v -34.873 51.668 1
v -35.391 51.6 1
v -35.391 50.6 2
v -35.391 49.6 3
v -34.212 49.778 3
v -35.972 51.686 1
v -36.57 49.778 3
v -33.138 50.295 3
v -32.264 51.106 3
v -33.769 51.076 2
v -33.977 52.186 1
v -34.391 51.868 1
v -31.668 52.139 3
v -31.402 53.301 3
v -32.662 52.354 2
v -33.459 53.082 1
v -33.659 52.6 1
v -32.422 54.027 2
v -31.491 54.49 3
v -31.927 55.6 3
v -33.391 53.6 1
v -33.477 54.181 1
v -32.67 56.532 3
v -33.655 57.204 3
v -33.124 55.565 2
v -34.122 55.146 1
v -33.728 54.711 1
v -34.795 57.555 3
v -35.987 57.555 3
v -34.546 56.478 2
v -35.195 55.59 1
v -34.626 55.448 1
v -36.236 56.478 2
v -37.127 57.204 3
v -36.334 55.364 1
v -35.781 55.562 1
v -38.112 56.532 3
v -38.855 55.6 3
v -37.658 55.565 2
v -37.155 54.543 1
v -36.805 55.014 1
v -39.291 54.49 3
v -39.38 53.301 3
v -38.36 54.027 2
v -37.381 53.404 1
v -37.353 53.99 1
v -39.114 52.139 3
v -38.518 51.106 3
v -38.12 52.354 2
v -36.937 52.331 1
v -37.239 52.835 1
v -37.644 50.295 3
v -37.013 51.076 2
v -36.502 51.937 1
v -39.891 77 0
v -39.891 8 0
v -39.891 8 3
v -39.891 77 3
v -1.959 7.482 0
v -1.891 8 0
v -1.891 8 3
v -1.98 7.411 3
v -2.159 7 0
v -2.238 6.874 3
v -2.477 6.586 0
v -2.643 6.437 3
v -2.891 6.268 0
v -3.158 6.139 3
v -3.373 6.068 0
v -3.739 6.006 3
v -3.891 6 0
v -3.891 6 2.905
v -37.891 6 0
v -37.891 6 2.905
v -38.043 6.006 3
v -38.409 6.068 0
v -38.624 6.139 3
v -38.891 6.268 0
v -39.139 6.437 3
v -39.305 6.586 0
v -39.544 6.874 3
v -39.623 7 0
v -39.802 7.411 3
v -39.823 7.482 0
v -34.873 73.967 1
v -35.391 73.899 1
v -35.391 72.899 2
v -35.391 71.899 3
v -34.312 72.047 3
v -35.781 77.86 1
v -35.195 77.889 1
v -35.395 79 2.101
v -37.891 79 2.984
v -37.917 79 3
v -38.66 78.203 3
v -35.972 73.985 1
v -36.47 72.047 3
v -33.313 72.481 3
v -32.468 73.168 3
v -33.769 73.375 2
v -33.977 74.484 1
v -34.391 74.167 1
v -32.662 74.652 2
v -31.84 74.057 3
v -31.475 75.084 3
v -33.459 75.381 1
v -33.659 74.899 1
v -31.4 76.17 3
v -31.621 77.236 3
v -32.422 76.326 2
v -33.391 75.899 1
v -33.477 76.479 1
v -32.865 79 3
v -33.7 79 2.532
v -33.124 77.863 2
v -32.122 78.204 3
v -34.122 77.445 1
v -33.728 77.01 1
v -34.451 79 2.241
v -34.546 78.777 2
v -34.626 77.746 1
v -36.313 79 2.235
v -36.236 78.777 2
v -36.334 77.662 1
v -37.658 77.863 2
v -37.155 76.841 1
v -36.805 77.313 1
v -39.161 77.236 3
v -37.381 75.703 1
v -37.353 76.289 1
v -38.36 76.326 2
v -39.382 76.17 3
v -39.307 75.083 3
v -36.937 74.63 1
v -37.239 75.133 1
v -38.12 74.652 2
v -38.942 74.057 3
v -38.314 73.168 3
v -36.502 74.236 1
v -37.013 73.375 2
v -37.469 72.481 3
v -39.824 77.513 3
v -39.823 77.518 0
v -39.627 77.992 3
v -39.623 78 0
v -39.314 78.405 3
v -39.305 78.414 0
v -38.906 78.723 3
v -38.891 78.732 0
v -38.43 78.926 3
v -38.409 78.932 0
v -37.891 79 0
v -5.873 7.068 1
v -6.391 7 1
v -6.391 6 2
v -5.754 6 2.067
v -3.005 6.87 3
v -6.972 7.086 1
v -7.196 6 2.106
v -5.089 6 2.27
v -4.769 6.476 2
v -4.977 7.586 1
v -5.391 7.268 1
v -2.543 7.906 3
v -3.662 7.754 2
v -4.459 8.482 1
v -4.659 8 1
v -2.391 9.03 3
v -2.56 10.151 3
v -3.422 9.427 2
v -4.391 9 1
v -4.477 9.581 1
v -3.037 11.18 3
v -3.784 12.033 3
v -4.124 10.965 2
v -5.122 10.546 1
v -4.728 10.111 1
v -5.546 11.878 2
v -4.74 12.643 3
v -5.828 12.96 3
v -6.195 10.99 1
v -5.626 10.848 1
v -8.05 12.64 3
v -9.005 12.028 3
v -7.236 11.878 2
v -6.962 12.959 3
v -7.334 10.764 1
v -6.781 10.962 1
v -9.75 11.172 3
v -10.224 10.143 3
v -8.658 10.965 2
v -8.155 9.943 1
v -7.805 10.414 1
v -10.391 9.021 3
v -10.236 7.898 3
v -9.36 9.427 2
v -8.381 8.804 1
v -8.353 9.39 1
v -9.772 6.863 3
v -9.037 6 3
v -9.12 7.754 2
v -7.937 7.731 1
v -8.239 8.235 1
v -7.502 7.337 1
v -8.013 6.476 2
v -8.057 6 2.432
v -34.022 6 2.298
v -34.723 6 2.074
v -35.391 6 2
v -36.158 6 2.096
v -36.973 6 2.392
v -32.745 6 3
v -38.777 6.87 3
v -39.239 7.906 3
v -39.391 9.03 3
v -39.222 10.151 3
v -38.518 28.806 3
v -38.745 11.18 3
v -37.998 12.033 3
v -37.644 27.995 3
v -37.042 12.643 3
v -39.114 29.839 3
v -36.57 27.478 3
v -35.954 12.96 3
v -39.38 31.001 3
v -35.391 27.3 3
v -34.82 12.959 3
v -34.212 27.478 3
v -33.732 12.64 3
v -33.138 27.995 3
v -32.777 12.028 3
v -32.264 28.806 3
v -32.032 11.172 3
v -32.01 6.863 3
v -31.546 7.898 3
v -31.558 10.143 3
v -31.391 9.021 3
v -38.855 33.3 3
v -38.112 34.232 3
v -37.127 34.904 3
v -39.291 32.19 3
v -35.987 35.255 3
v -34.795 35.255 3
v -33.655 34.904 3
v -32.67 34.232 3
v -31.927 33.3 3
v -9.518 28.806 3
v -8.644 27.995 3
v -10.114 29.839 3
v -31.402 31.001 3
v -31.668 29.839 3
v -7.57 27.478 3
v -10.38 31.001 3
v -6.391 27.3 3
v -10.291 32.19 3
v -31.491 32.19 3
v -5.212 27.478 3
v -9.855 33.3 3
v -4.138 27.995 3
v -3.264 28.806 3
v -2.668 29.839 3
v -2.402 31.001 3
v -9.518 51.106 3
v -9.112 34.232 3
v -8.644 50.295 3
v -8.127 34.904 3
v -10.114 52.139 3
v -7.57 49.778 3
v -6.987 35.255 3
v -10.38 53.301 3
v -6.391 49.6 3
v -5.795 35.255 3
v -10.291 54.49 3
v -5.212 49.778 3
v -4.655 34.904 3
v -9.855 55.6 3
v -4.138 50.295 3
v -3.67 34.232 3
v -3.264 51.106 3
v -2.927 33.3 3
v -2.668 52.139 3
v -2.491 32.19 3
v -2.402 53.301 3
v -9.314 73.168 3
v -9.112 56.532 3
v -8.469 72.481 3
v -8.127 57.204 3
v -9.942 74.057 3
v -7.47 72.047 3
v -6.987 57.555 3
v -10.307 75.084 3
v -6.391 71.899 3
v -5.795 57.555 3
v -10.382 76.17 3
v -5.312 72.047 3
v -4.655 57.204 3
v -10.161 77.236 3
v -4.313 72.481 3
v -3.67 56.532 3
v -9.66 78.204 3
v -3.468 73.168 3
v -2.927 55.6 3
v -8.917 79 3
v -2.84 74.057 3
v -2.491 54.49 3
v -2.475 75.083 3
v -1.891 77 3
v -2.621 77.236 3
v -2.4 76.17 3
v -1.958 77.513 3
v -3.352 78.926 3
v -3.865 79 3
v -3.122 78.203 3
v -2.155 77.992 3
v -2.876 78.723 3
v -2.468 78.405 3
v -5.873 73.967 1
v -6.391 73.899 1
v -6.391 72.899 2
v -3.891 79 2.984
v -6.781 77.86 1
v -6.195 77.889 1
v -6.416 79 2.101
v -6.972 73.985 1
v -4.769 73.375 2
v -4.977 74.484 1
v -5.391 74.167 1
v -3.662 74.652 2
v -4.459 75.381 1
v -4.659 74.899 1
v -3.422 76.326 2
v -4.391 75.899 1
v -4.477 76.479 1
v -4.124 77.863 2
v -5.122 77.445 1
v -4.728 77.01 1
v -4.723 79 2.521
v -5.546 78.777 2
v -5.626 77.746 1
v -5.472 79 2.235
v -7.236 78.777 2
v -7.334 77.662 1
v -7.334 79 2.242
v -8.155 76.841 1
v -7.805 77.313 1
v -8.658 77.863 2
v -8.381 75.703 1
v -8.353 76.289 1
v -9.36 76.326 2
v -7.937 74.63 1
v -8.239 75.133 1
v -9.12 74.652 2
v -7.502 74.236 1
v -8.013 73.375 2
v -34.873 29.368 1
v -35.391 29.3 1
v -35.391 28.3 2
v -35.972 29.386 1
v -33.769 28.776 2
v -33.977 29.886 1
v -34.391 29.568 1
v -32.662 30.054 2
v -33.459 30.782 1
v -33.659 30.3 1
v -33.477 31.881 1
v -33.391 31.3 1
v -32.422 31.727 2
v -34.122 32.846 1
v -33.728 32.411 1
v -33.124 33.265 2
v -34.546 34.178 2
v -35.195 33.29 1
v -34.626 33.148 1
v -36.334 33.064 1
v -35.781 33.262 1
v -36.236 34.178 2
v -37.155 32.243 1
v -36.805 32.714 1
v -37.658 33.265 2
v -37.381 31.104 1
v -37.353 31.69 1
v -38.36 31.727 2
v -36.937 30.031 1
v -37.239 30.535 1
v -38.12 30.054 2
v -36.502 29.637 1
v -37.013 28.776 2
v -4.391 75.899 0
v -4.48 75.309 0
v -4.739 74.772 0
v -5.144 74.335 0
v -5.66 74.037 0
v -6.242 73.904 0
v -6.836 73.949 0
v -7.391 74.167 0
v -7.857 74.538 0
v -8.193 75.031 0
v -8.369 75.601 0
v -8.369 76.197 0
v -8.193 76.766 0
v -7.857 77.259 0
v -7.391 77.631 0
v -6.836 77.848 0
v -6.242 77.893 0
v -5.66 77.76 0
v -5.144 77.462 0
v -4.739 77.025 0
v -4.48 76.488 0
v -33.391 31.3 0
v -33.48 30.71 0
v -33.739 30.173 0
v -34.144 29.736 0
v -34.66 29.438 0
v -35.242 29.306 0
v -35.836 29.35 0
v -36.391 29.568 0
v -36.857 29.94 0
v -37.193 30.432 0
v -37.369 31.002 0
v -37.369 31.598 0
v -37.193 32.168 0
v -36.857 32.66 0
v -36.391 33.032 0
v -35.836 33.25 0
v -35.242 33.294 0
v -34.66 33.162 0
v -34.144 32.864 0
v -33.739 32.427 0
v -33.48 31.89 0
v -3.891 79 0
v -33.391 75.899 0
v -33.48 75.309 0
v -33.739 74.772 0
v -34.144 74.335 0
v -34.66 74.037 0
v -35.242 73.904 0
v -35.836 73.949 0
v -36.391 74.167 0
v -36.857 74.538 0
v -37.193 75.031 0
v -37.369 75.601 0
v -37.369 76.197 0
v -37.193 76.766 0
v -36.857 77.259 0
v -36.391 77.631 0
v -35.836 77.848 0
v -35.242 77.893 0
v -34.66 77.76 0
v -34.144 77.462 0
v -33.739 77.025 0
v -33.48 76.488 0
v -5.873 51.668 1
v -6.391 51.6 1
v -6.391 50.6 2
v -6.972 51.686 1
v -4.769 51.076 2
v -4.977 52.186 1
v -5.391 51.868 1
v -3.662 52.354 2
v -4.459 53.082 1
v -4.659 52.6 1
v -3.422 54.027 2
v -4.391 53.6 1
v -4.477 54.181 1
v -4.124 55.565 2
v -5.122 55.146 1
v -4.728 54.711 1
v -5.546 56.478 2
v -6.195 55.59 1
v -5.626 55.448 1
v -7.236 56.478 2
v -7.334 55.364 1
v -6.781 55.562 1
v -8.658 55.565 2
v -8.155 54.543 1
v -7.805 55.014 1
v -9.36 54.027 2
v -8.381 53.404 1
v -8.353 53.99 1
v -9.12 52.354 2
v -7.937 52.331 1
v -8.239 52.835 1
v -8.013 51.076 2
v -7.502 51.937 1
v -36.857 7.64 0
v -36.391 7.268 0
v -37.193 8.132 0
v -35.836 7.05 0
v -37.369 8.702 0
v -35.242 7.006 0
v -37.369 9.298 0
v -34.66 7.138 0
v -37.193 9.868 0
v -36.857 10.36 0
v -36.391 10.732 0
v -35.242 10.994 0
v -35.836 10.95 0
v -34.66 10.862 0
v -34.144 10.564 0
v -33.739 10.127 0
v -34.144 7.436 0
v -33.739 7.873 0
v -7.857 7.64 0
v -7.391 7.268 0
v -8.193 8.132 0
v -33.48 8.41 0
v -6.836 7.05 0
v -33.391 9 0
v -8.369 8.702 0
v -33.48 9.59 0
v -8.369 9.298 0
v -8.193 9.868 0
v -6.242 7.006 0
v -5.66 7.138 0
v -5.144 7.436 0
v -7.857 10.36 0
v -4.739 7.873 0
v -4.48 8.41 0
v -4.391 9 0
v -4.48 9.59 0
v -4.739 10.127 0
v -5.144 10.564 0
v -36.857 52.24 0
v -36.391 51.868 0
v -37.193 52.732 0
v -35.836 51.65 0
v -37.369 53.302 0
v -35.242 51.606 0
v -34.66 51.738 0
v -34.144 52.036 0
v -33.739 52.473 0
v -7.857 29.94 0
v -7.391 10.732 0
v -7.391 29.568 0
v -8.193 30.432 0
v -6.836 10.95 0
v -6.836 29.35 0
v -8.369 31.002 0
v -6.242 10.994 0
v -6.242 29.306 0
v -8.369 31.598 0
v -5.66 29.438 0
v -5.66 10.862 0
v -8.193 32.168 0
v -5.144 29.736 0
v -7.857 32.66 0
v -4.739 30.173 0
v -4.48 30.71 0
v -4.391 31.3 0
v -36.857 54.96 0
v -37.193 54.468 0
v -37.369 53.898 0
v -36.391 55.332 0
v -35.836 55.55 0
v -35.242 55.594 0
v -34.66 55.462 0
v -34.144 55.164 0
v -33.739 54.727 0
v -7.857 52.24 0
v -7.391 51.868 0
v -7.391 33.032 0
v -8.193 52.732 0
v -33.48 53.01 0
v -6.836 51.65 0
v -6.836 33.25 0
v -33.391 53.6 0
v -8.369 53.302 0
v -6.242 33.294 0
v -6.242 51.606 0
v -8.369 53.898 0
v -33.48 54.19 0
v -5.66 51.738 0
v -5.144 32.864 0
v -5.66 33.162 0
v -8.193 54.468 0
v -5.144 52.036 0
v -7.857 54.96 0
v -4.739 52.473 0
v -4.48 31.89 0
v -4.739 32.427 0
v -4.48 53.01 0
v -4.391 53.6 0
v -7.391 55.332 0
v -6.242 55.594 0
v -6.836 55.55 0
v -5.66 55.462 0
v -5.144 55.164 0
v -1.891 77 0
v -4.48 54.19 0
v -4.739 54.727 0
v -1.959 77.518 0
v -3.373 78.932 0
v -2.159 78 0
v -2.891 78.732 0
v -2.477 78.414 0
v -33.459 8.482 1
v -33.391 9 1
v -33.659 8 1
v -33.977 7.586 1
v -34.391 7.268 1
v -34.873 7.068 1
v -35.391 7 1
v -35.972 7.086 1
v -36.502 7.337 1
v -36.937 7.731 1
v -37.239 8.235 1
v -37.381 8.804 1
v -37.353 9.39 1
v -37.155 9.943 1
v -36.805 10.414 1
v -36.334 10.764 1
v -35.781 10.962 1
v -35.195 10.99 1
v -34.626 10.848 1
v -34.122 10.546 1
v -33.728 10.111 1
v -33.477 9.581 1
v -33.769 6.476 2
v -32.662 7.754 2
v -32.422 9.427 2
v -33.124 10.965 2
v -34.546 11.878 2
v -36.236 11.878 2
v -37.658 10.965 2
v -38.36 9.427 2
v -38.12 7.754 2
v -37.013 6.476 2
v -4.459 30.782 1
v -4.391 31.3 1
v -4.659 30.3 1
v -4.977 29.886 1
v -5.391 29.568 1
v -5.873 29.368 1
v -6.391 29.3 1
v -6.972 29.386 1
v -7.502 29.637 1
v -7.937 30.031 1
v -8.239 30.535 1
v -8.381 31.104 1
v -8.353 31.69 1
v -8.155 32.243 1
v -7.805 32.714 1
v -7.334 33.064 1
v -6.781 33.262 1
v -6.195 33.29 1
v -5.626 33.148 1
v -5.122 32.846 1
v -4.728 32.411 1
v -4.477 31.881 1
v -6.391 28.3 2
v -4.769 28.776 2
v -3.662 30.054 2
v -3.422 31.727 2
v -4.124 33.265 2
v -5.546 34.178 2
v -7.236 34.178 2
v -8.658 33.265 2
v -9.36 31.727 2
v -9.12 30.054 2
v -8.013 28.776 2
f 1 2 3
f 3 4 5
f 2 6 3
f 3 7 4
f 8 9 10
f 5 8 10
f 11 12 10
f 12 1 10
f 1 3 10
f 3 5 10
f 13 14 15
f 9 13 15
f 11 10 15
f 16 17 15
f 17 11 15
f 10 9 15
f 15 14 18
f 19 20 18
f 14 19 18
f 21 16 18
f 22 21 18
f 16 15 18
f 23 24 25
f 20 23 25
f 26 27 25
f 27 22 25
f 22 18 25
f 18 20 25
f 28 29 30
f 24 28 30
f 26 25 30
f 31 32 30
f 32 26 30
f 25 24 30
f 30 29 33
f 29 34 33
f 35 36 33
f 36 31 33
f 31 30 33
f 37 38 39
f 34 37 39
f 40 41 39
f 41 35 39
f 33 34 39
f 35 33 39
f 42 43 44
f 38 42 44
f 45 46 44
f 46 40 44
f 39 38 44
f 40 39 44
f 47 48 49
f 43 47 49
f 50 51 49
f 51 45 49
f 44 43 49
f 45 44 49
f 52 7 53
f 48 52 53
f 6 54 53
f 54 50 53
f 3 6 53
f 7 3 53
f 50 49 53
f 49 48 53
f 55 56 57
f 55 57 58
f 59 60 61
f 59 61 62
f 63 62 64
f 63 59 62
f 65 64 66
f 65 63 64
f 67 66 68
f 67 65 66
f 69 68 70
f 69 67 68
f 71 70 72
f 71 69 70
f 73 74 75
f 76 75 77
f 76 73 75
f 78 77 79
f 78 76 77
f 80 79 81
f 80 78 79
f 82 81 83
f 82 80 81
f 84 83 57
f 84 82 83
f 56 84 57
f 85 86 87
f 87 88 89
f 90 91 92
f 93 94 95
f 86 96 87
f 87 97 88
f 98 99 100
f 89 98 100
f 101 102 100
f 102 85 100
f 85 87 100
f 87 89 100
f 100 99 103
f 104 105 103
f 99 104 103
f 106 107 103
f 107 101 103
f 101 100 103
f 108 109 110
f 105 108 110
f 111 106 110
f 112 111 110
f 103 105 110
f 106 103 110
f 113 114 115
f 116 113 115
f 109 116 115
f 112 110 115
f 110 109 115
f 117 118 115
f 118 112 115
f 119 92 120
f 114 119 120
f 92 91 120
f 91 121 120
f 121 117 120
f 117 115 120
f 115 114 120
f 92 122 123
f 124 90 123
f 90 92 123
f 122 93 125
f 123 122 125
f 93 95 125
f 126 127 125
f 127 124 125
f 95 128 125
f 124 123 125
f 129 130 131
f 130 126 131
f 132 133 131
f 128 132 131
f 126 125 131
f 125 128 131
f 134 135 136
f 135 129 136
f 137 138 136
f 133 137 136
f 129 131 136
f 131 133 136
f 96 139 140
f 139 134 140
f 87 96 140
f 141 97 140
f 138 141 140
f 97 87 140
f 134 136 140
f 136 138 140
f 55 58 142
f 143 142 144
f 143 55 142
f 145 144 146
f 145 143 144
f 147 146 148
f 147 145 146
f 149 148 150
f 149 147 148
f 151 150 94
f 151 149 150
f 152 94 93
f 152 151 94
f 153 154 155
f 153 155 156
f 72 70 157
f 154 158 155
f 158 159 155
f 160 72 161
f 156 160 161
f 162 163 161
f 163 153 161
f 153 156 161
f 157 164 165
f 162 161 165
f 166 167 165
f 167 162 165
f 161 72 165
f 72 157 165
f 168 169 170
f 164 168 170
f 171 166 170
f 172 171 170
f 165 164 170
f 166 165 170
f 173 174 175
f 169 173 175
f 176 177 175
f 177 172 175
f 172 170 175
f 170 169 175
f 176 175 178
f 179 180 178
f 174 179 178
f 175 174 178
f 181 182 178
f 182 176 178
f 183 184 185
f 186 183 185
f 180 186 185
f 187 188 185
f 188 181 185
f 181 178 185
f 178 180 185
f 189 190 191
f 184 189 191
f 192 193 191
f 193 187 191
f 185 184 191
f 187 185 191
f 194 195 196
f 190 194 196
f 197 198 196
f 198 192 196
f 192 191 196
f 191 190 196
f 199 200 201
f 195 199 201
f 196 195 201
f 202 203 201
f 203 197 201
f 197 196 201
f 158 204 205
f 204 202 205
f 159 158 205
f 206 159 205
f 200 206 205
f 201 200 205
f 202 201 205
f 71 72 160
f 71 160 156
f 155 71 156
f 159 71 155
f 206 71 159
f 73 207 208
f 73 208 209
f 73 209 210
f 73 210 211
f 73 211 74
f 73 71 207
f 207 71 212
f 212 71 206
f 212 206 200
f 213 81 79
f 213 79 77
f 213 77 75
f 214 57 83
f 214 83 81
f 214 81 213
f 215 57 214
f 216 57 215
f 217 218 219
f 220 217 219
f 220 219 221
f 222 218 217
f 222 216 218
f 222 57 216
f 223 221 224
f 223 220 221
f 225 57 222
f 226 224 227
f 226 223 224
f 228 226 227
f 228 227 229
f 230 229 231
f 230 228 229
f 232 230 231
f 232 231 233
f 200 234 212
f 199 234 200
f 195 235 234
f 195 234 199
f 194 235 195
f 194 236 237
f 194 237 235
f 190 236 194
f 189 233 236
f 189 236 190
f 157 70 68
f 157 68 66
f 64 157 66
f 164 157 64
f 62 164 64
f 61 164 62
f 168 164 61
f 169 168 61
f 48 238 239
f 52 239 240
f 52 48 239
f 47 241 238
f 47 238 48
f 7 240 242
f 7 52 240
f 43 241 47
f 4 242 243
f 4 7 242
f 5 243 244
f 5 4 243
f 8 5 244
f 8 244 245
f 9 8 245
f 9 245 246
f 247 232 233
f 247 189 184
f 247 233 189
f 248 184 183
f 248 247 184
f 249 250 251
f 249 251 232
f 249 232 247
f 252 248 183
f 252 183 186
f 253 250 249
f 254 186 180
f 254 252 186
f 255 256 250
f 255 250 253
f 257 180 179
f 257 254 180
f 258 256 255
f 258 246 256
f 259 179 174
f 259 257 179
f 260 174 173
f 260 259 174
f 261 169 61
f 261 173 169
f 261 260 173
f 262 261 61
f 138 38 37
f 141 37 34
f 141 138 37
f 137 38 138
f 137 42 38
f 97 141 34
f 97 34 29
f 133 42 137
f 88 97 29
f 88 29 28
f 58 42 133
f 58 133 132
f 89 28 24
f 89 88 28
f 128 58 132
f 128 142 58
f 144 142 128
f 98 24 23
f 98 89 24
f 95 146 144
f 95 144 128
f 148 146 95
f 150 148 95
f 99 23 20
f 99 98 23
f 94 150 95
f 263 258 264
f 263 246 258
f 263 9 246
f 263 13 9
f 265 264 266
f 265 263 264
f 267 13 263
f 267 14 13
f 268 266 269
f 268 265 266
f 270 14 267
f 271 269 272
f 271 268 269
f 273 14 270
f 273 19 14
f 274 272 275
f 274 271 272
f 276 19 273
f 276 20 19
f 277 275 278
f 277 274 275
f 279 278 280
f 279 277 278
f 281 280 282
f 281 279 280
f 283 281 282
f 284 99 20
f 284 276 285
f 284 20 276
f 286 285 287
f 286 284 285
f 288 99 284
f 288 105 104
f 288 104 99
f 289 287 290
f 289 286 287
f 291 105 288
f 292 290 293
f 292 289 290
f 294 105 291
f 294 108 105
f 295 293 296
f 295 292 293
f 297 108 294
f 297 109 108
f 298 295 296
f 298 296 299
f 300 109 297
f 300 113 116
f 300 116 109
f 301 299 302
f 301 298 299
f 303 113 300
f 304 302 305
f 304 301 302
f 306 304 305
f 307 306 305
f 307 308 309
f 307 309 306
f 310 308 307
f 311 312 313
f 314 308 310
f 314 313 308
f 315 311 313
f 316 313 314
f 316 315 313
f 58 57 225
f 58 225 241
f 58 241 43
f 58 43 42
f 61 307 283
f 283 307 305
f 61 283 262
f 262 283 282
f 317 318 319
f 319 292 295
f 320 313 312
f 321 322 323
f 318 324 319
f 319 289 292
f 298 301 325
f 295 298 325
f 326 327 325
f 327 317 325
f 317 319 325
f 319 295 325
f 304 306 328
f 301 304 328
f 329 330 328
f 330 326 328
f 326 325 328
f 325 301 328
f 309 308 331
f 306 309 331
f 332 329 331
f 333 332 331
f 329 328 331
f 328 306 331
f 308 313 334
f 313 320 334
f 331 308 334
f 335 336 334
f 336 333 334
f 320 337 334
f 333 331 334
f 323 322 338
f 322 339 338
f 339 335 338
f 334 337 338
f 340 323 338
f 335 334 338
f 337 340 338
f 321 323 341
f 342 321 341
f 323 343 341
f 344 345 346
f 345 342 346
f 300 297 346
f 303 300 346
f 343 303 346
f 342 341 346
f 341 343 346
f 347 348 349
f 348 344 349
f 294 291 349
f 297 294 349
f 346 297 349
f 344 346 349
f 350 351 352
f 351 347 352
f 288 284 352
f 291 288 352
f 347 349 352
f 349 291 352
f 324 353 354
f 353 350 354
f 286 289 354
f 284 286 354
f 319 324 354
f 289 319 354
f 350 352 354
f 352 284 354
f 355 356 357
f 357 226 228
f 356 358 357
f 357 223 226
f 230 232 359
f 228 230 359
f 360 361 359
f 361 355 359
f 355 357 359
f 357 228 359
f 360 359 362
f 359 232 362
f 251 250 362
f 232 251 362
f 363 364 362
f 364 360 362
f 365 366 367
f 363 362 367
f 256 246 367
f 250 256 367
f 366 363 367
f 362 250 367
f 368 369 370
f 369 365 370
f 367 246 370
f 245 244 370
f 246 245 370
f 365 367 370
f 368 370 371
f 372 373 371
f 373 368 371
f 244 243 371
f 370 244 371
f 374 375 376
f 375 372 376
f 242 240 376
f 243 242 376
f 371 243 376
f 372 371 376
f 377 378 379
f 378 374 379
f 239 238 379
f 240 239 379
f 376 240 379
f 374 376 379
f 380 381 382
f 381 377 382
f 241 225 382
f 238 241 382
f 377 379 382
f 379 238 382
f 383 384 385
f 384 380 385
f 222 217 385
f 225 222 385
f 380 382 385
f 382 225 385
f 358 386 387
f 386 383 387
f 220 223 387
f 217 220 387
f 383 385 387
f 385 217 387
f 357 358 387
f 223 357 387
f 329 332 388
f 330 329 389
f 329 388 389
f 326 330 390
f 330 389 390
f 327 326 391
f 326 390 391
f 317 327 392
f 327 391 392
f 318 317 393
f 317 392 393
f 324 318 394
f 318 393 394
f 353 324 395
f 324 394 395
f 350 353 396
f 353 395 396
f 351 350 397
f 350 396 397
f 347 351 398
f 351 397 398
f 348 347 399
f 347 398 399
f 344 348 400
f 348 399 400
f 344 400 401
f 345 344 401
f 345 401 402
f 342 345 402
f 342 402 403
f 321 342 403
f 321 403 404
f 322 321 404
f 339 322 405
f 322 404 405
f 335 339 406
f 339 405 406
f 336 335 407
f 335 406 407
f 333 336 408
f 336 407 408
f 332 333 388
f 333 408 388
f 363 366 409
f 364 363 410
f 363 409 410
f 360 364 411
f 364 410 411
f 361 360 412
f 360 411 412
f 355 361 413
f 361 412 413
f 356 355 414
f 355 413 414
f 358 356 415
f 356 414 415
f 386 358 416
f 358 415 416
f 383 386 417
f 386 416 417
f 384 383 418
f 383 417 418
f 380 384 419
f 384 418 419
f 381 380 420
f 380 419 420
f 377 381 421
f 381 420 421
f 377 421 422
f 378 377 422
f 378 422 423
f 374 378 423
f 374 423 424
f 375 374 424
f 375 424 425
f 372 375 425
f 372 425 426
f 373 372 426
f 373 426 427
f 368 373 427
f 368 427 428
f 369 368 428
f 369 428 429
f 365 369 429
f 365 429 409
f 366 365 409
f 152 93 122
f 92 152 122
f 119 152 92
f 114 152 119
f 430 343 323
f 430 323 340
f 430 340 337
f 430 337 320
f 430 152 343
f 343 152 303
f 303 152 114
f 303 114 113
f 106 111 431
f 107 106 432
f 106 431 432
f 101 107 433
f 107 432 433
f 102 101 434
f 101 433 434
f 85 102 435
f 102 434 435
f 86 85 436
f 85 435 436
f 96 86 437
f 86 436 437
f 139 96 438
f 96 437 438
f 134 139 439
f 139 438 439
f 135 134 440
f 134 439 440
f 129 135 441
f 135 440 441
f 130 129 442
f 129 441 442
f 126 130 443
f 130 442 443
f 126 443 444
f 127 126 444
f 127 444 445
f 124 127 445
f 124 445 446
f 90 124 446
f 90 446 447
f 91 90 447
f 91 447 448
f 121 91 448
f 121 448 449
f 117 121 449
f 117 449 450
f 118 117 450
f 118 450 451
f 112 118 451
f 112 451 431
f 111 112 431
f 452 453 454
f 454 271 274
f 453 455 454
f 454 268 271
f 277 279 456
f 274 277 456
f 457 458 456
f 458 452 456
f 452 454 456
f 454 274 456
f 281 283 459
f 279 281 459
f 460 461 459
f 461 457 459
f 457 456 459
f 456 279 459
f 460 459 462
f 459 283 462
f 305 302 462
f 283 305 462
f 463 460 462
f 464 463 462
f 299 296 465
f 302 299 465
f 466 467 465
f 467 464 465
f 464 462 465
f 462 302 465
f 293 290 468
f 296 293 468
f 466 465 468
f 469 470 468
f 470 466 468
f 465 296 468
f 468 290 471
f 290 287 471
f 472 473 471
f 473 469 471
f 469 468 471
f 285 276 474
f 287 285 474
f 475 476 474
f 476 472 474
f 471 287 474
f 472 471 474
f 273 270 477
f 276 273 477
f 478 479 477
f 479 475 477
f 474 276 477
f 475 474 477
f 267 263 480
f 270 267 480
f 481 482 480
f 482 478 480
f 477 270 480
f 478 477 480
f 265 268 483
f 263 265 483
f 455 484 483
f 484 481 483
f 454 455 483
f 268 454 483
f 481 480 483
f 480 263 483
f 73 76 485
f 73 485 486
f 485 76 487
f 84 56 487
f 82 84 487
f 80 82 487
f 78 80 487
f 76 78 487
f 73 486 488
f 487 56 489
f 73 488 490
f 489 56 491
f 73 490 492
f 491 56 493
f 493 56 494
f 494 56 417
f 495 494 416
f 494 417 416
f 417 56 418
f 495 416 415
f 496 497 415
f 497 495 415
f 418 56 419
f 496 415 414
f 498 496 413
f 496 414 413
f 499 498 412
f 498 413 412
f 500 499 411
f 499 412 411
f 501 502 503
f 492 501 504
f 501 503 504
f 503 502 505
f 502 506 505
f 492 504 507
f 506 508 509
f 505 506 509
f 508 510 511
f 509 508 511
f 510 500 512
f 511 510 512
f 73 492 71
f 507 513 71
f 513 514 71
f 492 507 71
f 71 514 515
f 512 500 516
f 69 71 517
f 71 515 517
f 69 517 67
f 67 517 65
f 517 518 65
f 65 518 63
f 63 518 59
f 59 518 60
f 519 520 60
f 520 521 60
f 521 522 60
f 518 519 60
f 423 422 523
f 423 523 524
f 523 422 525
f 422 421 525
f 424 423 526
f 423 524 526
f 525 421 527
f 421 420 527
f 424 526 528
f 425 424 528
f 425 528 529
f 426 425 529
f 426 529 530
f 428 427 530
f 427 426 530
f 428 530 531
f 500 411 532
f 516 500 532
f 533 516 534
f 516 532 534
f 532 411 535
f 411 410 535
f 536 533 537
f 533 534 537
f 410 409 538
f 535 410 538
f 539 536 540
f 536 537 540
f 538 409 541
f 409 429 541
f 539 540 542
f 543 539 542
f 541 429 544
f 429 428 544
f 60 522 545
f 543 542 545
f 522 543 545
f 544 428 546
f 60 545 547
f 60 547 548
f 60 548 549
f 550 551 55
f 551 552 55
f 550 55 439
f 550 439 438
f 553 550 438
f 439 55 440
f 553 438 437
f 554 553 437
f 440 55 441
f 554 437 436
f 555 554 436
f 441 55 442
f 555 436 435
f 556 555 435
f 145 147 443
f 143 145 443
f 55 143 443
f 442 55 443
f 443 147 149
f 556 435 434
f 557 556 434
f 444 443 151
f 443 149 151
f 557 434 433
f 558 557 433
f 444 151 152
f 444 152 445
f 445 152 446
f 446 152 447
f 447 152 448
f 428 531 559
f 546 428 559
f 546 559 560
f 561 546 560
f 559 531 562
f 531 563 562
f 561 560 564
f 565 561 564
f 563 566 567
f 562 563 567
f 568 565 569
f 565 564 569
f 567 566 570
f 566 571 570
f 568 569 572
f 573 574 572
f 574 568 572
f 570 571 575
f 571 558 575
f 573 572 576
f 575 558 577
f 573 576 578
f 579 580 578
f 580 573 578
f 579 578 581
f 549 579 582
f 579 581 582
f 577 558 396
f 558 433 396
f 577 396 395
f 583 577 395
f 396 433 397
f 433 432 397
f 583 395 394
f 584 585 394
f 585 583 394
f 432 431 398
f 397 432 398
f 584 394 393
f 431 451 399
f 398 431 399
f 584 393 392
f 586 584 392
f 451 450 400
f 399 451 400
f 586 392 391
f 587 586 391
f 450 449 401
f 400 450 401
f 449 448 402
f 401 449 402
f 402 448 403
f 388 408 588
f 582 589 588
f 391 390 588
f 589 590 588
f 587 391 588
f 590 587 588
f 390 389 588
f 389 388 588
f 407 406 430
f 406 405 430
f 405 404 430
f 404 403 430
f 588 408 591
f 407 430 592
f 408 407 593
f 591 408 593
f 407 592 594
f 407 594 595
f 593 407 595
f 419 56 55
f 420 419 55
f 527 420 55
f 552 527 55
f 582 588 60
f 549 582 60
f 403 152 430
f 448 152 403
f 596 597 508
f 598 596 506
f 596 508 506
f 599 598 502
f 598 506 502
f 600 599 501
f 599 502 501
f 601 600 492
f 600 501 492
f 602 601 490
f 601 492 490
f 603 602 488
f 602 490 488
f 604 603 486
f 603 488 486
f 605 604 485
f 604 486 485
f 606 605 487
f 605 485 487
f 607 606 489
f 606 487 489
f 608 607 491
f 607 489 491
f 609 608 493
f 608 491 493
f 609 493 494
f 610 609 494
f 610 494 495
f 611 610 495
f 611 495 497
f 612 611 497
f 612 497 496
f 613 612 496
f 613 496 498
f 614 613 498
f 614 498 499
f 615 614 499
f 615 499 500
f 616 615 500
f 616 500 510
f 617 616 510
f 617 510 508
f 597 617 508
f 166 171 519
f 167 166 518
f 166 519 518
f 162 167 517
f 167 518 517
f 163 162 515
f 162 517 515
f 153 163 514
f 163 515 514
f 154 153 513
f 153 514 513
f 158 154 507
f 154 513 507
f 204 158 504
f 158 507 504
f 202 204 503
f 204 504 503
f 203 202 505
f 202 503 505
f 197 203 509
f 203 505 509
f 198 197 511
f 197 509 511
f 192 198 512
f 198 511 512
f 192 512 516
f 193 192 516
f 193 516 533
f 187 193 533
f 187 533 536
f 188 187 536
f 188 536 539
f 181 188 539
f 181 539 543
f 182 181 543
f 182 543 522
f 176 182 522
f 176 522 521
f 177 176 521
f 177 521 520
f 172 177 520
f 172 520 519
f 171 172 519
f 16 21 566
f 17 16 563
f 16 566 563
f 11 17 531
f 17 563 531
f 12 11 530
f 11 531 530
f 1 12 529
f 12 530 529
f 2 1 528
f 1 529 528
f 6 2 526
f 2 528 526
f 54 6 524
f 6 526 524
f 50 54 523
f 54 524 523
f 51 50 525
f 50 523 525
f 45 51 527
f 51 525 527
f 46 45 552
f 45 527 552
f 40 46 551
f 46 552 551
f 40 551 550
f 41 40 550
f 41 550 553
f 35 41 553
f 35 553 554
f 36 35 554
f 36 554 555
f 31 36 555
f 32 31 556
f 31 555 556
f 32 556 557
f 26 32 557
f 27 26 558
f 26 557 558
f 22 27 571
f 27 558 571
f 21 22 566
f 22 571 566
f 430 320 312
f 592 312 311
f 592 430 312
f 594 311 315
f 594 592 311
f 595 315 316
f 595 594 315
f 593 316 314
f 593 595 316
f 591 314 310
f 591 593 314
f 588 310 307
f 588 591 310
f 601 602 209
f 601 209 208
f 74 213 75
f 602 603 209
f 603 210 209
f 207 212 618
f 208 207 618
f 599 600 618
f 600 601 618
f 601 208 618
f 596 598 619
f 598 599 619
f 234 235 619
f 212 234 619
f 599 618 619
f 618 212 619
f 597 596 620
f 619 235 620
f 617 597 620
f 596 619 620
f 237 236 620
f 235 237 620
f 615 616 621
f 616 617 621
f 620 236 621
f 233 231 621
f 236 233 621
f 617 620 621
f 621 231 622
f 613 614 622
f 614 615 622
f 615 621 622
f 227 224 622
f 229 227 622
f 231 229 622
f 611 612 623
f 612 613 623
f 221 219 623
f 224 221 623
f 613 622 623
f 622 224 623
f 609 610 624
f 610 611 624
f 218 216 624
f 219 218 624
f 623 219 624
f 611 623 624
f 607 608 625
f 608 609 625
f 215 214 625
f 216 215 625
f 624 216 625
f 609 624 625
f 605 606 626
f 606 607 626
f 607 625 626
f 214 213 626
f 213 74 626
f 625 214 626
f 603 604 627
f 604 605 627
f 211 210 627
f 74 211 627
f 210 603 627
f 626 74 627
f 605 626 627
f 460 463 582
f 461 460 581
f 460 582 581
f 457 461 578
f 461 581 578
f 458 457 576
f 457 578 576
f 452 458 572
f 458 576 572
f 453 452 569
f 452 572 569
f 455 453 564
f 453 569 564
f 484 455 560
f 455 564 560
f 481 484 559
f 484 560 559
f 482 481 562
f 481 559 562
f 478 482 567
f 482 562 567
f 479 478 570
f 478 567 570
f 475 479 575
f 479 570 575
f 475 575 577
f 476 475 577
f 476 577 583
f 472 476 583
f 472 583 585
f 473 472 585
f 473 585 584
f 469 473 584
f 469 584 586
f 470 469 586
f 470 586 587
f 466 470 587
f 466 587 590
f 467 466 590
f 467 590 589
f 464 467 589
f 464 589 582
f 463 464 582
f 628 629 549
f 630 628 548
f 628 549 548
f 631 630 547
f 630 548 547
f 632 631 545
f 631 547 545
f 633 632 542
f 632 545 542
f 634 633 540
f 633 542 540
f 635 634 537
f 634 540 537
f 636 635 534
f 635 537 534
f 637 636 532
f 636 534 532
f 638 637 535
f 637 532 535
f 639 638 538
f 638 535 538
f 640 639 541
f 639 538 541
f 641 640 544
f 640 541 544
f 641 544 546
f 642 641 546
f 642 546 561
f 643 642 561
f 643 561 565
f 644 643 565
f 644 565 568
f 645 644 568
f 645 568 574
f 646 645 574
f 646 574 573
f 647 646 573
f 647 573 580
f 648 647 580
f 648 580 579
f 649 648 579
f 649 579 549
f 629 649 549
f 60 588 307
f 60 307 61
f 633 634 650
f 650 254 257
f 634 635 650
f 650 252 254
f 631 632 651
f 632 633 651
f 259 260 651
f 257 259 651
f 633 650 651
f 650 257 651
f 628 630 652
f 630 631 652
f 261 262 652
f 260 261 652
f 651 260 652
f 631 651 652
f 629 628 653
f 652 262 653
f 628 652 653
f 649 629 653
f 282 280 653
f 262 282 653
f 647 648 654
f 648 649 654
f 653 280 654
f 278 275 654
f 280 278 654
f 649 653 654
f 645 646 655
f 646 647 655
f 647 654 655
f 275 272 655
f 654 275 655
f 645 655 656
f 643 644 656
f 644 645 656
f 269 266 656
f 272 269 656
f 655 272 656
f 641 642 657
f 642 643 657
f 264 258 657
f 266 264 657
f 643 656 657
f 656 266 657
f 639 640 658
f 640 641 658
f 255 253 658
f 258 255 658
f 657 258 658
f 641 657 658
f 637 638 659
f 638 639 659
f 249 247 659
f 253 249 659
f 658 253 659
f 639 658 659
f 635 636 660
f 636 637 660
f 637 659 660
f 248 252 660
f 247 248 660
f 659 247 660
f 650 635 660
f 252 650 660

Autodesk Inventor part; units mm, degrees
ref_plane "YZ Plane" through (0, 0, 0) normal (1, 0, 0) x (0, 1, 0)
ref_plane "XZ Plane" through (0, 0, 0) normal (0, 1, 0) x (-1, 0, 0)
ref_plane "XY Plane" through (0, 0, 0) normal (0, 0, 1) x (1, 0, 0)
sketch "Boceto1" plane through (0, 0, 0) normal (0, 0, 1) x (1, 0, 0)
  circle A0 centre (-35.391, 9) radius 2
  circle A1 centre (-6.391, 31.3) radius 2
  circle A2 centre (-6.391, 75.8986) radius 2
  circle A3 centre (-35.391, 75.8986) radius 2
  circle A4 centre (-35.391, 53.6) radius 2
  circle A5 centre (-6.391, 53.6) radius 2
  circle A6 centre (-6.391, 9) radius 2
  circle A7 centre (-35.391, 31.3) radius 2
  line L0 (-39.891, 8) -> (-39.891, 77)
  arc A8 (-39.891, 8) -> (-37.891, 6) centre (-37.891, 8) ccw
  line L1 (-3.891, 6) -> (-37.891, 6)
  arc A9 (-3.891, 6) -> (-1.891, 8) centre (-3.891, 8) ccw
  line L2 (-1.891, 77) -> (-1.891, 8)
  arc A10 (-1.891, 77) -> (-3.891, 79) centre (-3.891, 77) ccw
  line L3 (-37.891, 79) -> (-3.891, 79)
  arc A11 (-37.891, 79) -> (-39.891, 77) centre (-37.891, 77) ccw
  point P0 (0, 0)
  point P1 (-20.891, 10)
  dimension "d0" = 38
extrude "Extrusión1" add sketch "Boceto1" along normal blind 3
sketch "Boceto2" plane through (0, 0, 3) normal (0, 0, 1) x (1, 0, 0)
  point P0 (0, 0)
  point P1 (-35.391, 75.8986)
  point P2 (-6.391, 75.8986)
  point P3 (-6.391, 53.6)
  point P4 (-35.391, 53.6)
  point P5 (-35.391, 31.3)
  point P6 (-6.391, 31.3)
  point P7 (-35.391, 9)
  point P8 (-6.391, 9)
hole "Hole2" at (-35.391, 75.8986, 3) at (-6.391, 75.8986, 3) at (-6.391, 53.6, 3) at (-35.391, 53.6, 3) at (-35.391, 31.3, 3) at (-6.391, 31.3, 3) at (-35.391, 9, 3) at (-6.391, 9, 3) direction (0, 0, -1) diameter 4 end through all countersink diameter 8 countersink angle 90
equation "\"d17\" = Grosor"
equation "\"Radio_pliegue\" = Grosor"
equation "\"Anchura_desahogo_plegado\" = Grosor"
equation "\"Profundidad_desahogo_plegado\" = 0.5 * Grosor"
equation "\"Tamaño_destalonado\" = 4 * Grosor"
equation "\"Remanente_mínimo\" = 2 * Grosor"
equation "\"Radiodetransición\" = Radio_pliegue"
equation "\"Tamaño_de_radio_de_Jacobi\" = Radio_pliegue"
equation "\"TamañoSeparación\" = Grosor"
equation "\"Grosor\" = 0.5"
properties part number "Tapa"
